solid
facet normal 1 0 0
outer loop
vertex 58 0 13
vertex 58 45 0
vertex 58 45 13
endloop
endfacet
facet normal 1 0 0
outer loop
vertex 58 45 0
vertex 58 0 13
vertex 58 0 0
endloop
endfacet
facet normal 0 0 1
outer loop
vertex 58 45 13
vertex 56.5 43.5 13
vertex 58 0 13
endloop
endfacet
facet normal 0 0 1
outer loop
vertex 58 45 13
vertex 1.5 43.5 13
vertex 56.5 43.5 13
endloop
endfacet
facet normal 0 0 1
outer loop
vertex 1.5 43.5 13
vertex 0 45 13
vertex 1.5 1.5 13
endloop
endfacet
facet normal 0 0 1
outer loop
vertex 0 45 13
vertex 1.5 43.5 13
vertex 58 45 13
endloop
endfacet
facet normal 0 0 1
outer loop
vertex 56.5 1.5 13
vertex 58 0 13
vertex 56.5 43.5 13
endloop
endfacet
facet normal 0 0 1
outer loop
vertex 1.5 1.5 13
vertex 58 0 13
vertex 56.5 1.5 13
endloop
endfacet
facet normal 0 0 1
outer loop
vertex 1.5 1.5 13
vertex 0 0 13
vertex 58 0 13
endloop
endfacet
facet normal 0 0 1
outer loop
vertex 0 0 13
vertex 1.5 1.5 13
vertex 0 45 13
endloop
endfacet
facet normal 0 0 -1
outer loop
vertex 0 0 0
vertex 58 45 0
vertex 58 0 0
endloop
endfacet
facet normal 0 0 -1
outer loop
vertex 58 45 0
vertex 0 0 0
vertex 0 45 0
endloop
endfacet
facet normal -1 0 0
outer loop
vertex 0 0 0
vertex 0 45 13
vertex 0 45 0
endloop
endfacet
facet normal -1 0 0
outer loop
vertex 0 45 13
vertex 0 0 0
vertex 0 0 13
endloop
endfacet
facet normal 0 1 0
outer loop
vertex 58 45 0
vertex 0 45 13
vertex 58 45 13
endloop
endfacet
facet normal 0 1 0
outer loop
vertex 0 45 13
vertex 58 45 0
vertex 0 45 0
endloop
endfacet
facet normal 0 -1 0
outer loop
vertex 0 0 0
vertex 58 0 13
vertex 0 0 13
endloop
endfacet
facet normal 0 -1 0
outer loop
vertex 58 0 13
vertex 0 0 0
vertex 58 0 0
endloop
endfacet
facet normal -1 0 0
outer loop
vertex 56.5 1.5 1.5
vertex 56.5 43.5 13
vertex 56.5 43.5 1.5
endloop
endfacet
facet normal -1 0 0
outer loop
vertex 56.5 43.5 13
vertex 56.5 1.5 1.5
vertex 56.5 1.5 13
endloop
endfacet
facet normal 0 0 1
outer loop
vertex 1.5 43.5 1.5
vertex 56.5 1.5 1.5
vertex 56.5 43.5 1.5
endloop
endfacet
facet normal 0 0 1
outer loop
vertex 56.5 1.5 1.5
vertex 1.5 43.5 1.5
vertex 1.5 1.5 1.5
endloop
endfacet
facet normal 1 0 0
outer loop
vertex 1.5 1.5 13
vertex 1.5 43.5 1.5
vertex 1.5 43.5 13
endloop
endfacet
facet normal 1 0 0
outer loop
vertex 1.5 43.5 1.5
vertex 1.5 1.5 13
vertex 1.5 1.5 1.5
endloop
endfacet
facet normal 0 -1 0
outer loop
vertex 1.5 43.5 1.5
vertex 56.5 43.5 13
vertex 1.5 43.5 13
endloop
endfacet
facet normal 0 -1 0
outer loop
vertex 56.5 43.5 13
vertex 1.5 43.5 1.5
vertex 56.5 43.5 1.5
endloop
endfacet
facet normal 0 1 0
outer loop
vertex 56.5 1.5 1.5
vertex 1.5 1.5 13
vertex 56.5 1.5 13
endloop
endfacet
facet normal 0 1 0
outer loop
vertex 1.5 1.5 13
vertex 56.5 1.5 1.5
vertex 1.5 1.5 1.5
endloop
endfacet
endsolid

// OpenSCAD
wall_thickness = 1.5;
inner_dim_1 = [55,42,10];

//////////////////////////////////////////////////////////////////////////////////////////////////////////
outer_dim = [inner_dim_1[0] + wall_thickness  + wall_thickness ,inner_dim_1[1] + wall_thickness  + wall_thickness ,inner_dim_1[2] + wall_thickness  + wall_thickness];

difference(){
cube(outer_dim);
    translate([wall_thickness,wall_thickness,wall_thickness]){
        cube([inner_dim_1[0],inner_dim_1[1],1000]);
    }
}
